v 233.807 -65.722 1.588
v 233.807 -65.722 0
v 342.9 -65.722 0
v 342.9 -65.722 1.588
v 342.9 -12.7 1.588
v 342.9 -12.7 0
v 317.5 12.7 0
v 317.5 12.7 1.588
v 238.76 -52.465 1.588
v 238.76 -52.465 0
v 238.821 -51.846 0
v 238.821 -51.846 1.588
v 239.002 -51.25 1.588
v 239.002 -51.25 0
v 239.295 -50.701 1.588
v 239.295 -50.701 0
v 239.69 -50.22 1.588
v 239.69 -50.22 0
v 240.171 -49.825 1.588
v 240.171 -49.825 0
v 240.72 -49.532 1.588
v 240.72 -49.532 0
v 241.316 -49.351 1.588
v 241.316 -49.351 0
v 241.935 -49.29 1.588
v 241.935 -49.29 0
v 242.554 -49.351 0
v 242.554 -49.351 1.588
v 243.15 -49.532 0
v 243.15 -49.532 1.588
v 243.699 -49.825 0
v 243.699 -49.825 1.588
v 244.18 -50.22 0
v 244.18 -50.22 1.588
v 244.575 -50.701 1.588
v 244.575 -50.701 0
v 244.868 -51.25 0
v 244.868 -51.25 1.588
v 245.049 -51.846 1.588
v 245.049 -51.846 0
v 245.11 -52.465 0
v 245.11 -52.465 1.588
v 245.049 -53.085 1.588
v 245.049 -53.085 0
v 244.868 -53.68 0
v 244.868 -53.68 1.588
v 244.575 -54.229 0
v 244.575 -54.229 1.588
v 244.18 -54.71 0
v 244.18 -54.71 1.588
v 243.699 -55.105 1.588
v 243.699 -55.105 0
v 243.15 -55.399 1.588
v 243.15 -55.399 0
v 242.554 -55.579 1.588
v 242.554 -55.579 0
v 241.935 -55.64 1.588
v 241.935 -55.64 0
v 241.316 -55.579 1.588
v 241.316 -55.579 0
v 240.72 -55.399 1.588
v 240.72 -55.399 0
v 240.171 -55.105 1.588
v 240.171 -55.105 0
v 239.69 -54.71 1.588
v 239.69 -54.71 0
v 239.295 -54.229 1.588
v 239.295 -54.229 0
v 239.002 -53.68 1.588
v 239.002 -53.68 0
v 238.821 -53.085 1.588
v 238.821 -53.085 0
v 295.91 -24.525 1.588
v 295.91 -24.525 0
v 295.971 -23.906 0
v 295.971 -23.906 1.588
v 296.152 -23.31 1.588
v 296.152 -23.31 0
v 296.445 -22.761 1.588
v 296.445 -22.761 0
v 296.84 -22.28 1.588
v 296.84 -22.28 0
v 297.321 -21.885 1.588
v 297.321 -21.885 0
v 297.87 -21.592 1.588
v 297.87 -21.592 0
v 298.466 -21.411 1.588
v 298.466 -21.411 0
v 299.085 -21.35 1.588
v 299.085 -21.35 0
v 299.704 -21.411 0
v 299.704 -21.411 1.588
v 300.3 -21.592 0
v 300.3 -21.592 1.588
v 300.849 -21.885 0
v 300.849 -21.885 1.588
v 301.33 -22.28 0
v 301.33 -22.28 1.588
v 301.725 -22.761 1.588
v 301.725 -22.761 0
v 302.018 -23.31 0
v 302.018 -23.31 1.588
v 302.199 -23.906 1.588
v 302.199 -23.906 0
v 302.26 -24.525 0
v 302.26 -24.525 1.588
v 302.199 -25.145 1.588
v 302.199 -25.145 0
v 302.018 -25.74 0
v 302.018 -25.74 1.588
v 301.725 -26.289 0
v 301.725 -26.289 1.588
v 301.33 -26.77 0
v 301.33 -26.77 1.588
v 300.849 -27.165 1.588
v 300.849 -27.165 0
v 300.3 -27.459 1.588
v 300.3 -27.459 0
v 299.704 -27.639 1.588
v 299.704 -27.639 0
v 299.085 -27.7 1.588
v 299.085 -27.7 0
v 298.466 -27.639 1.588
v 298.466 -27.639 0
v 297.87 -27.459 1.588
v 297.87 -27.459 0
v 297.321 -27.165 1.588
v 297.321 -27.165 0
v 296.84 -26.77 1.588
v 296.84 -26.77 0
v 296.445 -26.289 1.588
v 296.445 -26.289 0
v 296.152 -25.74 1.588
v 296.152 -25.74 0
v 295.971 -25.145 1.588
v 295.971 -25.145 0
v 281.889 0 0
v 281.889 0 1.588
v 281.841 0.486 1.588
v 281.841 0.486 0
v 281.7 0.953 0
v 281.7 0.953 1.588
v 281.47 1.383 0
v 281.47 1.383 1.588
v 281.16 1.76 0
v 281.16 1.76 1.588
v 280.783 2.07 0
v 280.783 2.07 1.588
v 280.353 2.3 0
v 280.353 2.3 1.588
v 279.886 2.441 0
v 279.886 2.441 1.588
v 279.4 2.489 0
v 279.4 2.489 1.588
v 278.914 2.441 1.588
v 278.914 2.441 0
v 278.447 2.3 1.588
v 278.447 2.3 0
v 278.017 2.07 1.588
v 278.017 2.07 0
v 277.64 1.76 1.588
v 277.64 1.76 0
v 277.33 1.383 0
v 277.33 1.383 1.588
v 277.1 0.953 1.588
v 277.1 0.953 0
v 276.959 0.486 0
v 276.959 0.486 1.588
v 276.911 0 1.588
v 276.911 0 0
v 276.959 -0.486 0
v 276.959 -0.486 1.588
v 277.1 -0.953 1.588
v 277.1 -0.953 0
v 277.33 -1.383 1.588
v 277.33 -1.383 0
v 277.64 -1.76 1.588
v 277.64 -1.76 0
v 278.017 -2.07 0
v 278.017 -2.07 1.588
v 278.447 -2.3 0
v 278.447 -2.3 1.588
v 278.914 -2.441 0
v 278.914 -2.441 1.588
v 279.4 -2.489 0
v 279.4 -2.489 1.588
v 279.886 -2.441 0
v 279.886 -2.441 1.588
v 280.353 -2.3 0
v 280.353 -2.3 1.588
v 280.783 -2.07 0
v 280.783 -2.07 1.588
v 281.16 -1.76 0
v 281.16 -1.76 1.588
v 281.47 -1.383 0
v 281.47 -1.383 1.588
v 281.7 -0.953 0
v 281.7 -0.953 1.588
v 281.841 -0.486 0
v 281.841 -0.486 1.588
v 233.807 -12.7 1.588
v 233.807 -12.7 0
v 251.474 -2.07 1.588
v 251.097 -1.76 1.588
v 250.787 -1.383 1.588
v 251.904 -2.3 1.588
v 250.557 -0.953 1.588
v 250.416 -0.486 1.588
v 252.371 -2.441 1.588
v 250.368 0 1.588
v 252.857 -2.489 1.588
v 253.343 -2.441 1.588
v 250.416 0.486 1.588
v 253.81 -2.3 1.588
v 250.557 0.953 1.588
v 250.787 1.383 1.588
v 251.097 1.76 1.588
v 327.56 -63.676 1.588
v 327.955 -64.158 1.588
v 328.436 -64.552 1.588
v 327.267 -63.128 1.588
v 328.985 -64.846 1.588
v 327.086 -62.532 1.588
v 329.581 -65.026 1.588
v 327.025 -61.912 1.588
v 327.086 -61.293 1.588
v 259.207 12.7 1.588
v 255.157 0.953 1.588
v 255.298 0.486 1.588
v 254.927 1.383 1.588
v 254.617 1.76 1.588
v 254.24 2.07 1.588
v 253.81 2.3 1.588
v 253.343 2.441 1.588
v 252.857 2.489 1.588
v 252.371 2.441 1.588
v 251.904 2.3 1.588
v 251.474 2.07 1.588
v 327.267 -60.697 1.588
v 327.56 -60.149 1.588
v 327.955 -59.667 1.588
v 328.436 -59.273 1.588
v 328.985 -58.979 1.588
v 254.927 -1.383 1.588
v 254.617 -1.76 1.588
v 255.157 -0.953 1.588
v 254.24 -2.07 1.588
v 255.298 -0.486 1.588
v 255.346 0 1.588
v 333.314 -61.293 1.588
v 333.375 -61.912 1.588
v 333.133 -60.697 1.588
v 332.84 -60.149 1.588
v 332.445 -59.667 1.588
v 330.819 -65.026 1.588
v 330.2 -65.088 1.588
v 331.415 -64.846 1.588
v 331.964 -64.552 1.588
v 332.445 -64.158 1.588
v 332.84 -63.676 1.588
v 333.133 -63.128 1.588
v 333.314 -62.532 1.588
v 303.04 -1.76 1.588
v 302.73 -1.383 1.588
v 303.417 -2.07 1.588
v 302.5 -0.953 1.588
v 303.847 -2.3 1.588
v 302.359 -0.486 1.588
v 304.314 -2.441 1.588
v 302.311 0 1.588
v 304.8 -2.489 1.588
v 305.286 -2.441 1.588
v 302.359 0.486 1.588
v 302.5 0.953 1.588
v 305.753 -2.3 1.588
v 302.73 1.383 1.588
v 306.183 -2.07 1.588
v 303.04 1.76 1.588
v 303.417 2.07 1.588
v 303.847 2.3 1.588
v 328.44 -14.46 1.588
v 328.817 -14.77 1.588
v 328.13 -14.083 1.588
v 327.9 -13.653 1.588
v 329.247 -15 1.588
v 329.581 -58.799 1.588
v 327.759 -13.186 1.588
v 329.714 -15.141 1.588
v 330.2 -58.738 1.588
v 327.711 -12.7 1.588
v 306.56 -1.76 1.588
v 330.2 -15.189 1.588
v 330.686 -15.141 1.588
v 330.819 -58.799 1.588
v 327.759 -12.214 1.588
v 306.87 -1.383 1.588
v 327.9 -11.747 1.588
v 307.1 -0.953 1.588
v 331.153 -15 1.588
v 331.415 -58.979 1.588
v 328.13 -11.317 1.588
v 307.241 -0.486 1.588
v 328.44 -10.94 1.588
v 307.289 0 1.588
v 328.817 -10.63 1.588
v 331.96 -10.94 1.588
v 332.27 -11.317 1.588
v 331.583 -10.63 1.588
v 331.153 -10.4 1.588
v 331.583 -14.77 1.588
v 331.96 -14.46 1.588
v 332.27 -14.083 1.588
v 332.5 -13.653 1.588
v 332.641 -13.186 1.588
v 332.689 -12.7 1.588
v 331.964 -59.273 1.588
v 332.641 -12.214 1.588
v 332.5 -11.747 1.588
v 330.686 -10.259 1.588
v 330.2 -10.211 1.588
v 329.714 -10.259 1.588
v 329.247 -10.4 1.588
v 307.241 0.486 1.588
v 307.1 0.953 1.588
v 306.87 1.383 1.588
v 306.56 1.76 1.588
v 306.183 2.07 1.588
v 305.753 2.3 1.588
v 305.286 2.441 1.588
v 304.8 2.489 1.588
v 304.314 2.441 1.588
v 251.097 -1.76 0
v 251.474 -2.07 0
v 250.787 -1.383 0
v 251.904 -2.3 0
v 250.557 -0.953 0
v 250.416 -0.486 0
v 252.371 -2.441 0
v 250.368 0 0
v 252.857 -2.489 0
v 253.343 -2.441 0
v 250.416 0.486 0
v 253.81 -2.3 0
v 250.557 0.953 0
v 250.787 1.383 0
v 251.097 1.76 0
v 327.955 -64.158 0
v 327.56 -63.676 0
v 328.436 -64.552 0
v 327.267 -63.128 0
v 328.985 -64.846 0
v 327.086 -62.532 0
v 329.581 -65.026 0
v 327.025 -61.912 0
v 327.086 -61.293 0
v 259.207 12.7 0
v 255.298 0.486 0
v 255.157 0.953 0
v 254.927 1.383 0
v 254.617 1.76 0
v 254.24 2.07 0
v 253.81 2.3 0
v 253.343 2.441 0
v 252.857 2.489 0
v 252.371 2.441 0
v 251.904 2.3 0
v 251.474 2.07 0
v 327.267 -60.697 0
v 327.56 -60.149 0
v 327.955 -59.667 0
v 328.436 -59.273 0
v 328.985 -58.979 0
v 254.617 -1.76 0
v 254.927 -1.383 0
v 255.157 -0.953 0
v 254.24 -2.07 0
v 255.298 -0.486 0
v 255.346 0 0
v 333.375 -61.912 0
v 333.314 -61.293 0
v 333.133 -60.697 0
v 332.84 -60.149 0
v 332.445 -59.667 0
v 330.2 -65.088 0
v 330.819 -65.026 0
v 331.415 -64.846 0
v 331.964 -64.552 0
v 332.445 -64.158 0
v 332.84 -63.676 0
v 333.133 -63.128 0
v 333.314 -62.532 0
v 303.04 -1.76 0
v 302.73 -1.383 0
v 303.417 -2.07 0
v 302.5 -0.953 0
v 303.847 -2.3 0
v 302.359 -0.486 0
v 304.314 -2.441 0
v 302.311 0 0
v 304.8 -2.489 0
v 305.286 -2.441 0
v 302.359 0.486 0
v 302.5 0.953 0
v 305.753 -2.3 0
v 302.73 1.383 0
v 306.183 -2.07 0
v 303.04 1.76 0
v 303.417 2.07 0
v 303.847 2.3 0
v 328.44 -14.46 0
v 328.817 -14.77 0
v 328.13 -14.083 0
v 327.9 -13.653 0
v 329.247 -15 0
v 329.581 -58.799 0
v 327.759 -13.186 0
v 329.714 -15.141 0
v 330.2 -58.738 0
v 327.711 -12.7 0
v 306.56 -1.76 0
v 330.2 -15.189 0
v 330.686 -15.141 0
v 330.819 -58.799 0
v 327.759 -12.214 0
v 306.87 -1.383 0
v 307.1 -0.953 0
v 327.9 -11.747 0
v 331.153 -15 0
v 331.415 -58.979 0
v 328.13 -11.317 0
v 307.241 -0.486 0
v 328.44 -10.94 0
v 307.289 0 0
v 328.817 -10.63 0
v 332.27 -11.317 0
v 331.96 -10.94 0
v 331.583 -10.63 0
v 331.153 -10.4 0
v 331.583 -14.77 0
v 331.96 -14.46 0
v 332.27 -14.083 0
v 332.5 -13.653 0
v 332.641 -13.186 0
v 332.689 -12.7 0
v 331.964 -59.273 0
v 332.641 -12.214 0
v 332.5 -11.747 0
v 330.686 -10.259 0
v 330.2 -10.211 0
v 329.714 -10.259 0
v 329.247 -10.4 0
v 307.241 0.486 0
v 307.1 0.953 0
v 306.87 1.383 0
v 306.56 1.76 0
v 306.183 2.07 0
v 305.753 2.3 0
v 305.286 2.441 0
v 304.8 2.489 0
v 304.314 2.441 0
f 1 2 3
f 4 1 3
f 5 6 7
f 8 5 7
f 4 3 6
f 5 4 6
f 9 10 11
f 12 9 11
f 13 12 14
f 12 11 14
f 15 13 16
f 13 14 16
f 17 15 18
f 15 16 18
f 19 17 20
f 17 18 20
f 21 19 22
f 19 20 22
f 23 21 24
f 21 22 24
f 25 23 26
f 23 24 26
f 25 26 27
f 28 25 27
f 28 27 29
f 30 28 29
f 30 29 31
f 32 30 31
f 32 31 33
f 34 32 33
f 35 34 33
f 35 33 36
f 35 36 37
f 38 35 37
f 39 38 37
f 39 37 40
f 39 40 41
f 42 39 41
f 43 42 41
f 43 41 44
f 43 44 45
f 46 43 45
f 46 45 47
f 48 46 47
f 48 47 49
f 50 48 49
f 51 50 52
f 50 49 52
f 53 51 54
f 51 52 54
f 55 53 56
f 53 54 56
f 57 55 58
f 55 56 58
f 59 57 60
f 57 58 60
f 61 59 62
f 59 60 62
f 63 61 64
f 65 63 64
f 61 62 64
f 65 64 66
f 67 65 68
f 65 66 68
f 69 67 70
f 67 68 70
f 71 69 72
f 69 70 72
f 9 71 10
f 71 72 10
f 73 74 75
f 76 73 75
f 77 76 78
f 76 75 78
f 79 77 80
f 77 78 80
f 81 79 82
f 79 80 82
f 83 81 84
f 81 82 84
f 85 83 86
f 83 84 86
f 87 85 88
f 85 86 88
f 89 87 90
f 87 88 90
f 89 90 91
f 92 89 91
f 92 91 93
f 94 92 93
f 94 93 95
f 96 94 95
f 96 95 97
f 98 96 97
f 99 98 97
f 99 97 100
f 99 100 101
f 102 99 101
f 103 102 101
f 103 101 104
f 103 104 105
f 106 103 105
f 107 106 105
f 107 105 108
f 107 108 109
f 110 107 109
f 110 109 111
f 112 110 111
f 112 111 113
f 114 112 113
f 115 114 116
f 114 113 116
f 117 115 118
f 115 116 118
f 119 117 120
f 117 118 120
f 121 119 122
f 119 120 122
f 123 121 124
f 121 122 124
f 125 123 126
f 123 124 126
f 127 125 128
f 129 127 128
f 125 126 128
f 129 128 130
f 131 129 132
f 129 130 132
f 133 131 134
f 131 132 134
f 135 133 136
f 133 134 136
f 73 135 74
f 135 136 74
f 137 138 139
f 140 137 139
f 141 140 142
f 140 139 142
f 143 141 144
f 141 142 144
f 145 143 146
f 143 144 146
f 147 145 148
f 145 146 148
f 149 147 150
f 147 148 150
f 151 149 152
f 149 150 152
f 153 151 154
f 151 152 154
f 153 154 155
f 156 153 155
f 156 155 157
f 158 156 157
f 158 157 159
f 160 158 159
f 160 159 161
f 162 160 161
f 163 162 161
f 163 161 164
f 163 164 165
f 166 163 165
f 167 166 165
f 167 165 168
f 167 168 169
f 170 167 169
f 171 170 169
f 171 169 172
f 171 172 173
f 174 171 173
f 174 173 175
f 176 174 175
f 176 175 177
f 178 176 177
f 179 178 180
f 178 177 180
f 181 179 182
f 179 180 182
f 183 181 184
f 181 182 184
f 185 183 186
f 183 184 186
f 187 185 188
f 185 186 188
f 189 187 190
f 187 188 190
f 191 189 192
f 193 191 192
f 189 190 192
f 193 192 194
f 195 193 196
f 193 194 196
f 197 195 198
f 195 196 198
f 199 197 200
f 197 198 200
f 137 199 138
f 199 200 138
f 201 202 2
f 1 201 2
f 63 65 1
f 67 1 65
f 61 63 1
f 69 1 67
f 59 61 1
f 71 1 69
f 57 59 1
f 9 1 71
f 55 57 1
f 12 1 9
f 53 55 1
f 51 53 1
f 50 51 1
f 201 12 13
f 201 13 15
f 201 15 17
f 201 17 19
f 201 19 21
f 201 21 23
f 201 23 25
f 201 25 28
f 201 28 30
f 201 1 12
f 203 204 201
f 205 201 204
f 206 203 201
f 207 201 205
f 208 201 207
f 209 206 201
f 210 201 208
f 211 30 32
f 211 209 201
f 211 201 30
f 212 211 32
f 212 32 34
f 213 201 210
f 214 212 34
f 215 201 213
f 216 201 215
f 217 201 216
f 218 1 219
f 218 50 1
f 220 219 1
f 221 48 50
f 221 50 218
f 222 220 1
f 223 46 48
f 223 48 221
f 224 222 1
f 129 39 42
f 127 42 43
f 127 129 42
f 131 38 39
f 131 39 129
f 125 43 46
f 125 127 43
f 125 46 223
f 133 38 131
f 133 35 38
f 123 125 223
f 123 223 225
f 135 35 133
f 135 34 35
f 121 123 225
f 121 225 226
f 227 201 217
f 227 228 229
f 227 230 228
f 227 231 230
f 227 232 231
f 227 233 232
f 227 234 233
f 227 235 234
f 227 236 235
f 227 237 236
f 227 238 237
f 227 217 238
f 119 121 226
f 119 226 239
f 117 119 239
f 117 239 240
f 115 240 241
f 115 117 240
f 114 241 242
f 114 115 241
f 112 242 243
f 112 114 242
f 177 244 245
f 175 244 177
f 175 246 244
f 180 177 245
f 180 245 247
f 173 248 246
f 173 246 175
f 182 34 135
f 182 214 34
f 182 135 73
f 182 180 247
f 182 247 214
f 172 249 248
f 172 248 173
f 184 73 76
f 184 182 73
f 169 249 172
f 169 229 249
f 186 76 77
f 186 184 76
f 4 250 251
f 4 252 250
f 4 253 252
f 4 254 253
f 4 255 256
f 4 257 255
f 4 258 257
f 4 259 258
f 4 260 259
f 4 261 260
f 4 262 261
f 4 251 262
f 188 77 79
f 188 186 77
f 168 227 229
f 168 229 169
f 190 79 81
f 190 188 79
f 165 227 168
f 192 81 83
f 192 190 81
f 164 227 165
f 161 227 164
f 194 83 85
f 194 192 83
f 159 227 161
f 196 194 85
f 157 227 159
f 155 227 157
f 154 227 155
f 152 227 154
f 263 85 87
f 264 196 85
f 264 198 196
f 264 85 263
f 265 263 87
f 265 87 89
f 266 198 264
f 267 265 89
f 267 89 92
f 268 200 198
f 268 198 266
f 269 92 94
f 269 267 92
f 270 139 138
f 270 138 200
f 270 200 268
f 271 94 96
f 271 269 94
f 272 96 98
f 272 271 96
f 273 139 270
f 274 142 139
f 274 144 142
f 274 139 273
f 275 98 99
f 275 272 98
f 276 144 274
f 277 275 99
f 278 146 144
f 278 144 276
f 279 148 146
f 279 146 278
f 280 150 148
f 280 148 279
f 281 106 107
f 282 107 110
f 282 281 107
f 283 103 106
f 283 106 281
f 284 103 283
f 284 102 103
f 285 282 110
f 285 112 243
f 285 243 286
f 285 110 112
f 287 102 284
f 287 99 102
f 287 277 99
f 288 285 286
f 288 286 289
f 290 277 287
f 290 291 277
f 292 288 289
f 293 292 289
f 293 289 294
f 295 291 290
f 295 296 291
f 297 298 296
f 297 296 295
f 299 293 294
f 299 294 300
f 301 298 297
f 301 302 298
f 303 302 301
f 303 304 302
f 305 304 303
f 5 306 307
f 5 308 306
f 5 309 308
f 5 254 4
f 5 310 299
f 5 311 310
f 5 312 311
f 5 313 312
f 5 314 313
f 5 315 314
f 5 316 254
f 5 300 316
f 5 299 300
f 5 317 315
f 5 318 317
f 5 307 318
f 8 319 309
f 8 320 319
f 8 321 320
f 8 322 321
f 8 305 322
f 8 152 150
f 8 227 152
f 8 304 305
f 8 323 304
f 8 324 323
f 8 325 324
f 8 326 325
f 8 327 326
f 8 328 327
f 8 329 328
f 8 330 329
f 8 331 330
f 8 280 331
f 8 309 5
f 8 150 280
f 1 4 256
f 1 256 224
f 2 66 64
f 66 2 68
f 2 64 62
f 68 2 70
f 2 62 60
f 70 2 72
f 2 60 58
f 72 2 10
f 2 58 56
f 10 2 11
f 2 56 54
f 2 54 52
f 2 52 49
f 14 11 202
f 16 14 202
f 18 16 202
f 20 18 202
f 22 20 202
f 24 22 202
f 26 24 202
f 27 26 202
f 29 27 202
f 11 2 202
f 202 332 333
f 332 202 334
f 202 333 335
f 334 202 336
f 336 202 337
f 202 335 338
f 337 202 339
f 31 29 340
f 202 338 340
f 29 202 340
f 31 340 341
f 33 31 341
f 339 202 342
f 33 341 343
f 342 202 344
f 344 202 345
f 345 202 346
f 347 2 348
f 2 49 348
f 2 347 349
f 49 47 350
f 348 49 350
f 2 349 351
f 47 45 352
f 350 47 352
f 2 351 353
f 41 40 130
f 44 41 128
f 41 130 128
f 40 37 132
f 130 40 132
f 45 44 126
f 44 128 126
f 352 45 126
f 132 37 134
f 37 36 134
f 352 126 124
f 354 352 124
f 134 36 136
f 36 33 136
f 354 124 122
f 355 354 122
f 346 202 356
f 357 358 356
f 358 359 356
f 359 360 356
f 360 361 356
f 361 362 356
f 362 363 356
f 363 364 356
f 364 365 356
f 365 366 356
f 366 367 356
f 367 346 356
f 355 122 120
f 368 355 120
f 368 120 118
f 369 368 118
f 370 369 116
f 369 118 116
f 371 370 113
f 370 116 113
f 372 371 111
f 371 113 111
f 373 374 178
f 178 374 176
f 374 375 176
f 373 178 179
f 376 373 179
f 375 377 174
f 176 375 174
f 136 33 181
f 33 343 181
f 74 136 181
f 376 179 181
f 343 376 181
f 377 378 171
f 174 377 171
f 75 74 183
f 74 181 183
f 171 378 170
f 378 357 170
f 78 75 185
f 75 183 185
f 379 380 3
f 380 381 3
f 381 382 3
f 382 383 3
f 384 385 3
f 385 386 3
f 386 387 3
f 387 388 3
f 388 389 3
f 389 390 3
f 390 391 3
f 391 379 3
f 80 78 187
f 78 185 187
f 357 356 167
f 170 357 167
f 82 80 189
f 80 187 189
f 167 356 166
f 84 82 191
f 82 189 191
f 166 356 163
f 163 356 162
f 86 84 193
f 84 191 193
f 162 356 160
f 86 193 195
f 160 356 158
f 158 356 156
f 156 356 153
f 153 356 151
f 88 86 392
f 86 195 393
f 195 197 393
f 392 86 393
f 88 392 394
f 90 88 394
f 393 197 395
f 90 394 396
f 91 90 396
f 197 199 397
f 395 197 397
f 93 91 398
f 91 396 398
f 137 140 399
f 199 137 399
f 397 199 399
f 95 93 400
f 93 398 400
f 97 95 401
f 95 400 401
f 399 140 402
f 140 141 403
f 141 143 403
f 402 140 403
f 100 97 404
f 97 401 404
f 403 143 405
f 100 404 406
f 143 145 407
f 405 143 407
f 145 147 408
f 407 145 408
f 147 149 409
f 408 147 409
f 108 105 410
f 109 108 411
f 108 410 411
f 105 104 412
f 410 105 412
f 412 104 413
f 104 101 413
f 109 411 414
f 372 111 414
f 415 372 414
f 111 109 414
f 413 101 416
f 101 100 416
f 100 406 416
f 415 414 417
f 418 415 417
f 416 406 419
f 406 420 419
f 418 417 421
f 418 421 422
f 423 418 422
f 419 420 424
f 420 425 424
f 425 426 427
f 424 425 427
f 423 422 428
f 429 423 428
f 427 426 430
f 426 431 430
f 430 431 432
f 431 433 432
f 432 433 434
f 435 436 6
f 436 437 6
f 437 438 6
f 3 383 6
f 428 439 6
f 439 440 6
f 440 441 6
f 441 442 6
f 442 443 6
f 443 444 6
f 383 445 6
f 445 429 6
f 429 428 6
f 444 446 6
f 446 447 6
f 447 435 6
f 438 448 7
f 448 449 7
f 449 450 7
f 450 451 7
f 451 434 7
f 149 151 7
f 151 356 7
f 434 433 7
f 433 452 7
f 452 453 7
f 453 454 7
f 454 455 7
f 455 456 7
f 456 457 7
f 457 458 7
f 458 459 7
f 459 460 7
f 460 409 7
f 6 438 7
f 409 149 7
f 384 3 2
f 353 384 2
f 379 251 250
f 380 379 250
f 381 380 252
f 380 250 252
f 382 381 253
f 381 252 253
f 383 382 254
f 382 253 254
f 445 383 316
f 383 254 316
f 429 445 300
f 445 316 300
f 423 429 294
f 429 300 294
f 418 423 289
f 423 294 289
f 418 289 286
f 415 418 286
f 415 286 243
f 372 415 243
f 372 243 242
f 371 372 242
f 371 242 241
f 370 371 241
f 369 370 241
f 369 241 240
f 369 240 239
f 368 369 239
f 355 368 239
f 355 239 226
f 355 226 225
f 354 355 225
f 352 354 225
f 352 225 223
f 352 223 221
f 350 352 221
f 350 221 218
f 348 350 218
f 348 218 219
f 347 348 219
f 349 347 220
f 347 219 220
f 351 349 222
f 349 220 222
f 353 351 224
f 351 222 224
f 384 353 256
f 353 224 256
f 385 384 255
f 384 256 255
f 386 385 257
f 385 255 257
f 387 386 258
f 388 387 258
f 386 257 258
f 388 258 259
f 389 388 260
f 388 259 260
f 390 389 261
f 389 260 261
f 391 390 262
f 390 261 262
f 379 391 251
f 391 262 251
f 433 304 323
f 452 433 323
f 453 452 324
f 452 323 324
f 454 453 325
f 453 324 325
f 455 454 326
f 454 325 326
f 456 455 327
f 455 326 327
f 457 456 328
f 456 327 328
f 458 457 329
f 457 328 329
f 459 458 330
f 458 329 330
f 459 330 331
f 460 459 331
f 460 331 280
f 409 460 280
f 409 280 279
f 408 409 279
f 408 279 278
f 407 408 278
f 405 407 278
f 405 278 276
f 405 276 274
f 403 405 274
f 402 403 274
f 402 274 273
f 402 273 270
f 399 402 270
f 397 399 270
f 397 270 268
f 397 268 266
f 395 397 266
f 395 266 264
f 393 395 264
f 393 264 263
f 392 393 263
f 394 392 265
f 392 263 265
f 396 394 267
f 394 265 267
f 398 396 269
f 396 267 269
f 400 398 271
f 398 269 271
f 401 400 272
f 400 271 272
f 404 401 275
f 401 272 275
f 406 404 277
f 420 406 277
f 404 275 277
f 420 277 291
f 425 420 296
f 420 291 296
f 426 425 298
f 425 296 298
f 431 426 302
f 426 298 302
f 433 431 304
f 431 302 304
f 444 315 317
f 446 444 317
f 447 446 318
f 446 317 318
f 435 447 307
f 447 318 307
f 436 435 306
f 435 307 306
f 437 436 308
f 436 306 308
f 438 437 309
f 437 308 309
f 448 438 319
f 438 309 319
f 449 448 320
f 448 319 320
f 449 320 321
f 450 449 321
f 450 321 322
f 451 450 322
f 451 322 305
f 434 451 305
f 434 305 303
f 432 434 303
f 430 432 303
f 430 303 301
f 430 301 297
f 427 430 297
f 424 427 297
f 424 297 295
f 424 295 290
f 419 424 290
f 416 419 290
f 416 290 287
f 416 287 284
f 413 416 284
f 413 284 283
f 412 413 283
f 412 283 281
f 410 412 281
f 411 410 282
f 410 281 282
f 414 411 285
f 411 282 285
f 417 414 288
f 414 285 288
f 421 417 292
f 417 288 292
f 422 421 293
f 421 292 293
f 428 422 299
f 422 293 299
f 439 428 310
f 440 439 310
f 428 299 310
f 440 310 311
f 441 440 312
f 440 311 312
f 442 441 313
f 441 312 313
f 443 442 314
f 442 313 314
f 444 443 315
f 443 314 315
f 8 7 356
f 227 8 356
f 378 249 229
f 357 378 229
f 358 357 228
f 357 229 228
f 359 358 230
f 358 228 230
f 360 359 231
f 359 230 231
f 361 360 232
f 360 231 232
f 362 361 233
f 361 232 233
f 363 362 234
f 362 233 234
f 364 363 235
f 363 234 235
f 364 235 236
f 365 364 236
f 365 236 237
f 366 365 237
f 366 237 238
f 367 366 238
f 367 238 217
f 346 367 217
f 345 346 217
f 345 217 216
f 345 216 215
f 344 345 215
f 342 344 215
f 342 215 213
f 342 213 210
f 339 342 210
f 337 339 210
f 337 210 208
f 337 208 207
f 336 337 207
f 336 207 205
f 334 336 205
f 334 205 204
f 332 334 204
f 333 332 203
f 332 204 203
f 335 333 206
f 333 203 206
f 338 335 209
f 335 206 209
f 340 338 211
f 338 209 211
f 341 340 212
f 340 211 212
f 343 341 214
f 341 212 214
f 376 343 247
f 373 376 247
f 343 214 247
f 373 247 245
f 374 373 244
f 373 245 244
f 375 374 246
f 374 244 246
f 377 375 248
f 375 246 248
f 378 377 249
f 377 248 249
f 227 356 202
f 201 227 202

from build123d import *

# Parameters (mm, degrees)
BOSS_EXTRUDE1_DEPTH         = 1.5875
F_10_CLEARANCE_HOLE1_D      = 4.9784
F_1_4_0_25_DIAMETER_HOLE1_D = 6.35
F_1_4_0_25_DIAMETER_HOLE2_D = 6.35


with BuildPart() as part:
    # Sketch1 → Boss-Extrude1 (new body)
    with BuildSketch(Plane.XY):
        Polygon((233.807000506, -12.7), (233.807000506, -65.7225), (342.900001016, -65.7225), (342.900001016, -12.7), (317.500001016, 12.7), (259.207000506, 12.7), align=None)
    extrude(amount=BOSS_EXTRUDE1_DEPTH)

    # #10 Clearance Hole1 (through all)
    with Locations(Plane(origin=(0, 0, 0), x_dir=(-1, 0, 0), z_dir=(0, 0, -1))):
        with Locations((-330.199999492, -12.7), (-304.799999492, 0), (-279.399999492, 0), (-252.857001004, -8e-09)):
            Hole(F_10_CLEARANCE_HOLE1_D / 2)

    # 1/4 (0.25) Diameter Hole1 (through all)
    with Locations(Plane(origin=(0, 0, 0), x_dir=(-1, 0, 0), z_dir=(0, 0, -1))):
        with Locations((-330.200001016, -61.9125)):
            Hole(F_1_4_0_25_DIAMETER_HOLE1_D / 2)

    # 1/4 (0.25) Diameter Hole2 (through all)
    with Locations(Plane.XY.offset(1.5875)):
        with Locations((299.085001016, -24.525188452), (241.935001016, -52.465188452)):
            Hole(F_1_4_0_25_DIAMETER_HOLE2_D / 2)


solid = part.part
